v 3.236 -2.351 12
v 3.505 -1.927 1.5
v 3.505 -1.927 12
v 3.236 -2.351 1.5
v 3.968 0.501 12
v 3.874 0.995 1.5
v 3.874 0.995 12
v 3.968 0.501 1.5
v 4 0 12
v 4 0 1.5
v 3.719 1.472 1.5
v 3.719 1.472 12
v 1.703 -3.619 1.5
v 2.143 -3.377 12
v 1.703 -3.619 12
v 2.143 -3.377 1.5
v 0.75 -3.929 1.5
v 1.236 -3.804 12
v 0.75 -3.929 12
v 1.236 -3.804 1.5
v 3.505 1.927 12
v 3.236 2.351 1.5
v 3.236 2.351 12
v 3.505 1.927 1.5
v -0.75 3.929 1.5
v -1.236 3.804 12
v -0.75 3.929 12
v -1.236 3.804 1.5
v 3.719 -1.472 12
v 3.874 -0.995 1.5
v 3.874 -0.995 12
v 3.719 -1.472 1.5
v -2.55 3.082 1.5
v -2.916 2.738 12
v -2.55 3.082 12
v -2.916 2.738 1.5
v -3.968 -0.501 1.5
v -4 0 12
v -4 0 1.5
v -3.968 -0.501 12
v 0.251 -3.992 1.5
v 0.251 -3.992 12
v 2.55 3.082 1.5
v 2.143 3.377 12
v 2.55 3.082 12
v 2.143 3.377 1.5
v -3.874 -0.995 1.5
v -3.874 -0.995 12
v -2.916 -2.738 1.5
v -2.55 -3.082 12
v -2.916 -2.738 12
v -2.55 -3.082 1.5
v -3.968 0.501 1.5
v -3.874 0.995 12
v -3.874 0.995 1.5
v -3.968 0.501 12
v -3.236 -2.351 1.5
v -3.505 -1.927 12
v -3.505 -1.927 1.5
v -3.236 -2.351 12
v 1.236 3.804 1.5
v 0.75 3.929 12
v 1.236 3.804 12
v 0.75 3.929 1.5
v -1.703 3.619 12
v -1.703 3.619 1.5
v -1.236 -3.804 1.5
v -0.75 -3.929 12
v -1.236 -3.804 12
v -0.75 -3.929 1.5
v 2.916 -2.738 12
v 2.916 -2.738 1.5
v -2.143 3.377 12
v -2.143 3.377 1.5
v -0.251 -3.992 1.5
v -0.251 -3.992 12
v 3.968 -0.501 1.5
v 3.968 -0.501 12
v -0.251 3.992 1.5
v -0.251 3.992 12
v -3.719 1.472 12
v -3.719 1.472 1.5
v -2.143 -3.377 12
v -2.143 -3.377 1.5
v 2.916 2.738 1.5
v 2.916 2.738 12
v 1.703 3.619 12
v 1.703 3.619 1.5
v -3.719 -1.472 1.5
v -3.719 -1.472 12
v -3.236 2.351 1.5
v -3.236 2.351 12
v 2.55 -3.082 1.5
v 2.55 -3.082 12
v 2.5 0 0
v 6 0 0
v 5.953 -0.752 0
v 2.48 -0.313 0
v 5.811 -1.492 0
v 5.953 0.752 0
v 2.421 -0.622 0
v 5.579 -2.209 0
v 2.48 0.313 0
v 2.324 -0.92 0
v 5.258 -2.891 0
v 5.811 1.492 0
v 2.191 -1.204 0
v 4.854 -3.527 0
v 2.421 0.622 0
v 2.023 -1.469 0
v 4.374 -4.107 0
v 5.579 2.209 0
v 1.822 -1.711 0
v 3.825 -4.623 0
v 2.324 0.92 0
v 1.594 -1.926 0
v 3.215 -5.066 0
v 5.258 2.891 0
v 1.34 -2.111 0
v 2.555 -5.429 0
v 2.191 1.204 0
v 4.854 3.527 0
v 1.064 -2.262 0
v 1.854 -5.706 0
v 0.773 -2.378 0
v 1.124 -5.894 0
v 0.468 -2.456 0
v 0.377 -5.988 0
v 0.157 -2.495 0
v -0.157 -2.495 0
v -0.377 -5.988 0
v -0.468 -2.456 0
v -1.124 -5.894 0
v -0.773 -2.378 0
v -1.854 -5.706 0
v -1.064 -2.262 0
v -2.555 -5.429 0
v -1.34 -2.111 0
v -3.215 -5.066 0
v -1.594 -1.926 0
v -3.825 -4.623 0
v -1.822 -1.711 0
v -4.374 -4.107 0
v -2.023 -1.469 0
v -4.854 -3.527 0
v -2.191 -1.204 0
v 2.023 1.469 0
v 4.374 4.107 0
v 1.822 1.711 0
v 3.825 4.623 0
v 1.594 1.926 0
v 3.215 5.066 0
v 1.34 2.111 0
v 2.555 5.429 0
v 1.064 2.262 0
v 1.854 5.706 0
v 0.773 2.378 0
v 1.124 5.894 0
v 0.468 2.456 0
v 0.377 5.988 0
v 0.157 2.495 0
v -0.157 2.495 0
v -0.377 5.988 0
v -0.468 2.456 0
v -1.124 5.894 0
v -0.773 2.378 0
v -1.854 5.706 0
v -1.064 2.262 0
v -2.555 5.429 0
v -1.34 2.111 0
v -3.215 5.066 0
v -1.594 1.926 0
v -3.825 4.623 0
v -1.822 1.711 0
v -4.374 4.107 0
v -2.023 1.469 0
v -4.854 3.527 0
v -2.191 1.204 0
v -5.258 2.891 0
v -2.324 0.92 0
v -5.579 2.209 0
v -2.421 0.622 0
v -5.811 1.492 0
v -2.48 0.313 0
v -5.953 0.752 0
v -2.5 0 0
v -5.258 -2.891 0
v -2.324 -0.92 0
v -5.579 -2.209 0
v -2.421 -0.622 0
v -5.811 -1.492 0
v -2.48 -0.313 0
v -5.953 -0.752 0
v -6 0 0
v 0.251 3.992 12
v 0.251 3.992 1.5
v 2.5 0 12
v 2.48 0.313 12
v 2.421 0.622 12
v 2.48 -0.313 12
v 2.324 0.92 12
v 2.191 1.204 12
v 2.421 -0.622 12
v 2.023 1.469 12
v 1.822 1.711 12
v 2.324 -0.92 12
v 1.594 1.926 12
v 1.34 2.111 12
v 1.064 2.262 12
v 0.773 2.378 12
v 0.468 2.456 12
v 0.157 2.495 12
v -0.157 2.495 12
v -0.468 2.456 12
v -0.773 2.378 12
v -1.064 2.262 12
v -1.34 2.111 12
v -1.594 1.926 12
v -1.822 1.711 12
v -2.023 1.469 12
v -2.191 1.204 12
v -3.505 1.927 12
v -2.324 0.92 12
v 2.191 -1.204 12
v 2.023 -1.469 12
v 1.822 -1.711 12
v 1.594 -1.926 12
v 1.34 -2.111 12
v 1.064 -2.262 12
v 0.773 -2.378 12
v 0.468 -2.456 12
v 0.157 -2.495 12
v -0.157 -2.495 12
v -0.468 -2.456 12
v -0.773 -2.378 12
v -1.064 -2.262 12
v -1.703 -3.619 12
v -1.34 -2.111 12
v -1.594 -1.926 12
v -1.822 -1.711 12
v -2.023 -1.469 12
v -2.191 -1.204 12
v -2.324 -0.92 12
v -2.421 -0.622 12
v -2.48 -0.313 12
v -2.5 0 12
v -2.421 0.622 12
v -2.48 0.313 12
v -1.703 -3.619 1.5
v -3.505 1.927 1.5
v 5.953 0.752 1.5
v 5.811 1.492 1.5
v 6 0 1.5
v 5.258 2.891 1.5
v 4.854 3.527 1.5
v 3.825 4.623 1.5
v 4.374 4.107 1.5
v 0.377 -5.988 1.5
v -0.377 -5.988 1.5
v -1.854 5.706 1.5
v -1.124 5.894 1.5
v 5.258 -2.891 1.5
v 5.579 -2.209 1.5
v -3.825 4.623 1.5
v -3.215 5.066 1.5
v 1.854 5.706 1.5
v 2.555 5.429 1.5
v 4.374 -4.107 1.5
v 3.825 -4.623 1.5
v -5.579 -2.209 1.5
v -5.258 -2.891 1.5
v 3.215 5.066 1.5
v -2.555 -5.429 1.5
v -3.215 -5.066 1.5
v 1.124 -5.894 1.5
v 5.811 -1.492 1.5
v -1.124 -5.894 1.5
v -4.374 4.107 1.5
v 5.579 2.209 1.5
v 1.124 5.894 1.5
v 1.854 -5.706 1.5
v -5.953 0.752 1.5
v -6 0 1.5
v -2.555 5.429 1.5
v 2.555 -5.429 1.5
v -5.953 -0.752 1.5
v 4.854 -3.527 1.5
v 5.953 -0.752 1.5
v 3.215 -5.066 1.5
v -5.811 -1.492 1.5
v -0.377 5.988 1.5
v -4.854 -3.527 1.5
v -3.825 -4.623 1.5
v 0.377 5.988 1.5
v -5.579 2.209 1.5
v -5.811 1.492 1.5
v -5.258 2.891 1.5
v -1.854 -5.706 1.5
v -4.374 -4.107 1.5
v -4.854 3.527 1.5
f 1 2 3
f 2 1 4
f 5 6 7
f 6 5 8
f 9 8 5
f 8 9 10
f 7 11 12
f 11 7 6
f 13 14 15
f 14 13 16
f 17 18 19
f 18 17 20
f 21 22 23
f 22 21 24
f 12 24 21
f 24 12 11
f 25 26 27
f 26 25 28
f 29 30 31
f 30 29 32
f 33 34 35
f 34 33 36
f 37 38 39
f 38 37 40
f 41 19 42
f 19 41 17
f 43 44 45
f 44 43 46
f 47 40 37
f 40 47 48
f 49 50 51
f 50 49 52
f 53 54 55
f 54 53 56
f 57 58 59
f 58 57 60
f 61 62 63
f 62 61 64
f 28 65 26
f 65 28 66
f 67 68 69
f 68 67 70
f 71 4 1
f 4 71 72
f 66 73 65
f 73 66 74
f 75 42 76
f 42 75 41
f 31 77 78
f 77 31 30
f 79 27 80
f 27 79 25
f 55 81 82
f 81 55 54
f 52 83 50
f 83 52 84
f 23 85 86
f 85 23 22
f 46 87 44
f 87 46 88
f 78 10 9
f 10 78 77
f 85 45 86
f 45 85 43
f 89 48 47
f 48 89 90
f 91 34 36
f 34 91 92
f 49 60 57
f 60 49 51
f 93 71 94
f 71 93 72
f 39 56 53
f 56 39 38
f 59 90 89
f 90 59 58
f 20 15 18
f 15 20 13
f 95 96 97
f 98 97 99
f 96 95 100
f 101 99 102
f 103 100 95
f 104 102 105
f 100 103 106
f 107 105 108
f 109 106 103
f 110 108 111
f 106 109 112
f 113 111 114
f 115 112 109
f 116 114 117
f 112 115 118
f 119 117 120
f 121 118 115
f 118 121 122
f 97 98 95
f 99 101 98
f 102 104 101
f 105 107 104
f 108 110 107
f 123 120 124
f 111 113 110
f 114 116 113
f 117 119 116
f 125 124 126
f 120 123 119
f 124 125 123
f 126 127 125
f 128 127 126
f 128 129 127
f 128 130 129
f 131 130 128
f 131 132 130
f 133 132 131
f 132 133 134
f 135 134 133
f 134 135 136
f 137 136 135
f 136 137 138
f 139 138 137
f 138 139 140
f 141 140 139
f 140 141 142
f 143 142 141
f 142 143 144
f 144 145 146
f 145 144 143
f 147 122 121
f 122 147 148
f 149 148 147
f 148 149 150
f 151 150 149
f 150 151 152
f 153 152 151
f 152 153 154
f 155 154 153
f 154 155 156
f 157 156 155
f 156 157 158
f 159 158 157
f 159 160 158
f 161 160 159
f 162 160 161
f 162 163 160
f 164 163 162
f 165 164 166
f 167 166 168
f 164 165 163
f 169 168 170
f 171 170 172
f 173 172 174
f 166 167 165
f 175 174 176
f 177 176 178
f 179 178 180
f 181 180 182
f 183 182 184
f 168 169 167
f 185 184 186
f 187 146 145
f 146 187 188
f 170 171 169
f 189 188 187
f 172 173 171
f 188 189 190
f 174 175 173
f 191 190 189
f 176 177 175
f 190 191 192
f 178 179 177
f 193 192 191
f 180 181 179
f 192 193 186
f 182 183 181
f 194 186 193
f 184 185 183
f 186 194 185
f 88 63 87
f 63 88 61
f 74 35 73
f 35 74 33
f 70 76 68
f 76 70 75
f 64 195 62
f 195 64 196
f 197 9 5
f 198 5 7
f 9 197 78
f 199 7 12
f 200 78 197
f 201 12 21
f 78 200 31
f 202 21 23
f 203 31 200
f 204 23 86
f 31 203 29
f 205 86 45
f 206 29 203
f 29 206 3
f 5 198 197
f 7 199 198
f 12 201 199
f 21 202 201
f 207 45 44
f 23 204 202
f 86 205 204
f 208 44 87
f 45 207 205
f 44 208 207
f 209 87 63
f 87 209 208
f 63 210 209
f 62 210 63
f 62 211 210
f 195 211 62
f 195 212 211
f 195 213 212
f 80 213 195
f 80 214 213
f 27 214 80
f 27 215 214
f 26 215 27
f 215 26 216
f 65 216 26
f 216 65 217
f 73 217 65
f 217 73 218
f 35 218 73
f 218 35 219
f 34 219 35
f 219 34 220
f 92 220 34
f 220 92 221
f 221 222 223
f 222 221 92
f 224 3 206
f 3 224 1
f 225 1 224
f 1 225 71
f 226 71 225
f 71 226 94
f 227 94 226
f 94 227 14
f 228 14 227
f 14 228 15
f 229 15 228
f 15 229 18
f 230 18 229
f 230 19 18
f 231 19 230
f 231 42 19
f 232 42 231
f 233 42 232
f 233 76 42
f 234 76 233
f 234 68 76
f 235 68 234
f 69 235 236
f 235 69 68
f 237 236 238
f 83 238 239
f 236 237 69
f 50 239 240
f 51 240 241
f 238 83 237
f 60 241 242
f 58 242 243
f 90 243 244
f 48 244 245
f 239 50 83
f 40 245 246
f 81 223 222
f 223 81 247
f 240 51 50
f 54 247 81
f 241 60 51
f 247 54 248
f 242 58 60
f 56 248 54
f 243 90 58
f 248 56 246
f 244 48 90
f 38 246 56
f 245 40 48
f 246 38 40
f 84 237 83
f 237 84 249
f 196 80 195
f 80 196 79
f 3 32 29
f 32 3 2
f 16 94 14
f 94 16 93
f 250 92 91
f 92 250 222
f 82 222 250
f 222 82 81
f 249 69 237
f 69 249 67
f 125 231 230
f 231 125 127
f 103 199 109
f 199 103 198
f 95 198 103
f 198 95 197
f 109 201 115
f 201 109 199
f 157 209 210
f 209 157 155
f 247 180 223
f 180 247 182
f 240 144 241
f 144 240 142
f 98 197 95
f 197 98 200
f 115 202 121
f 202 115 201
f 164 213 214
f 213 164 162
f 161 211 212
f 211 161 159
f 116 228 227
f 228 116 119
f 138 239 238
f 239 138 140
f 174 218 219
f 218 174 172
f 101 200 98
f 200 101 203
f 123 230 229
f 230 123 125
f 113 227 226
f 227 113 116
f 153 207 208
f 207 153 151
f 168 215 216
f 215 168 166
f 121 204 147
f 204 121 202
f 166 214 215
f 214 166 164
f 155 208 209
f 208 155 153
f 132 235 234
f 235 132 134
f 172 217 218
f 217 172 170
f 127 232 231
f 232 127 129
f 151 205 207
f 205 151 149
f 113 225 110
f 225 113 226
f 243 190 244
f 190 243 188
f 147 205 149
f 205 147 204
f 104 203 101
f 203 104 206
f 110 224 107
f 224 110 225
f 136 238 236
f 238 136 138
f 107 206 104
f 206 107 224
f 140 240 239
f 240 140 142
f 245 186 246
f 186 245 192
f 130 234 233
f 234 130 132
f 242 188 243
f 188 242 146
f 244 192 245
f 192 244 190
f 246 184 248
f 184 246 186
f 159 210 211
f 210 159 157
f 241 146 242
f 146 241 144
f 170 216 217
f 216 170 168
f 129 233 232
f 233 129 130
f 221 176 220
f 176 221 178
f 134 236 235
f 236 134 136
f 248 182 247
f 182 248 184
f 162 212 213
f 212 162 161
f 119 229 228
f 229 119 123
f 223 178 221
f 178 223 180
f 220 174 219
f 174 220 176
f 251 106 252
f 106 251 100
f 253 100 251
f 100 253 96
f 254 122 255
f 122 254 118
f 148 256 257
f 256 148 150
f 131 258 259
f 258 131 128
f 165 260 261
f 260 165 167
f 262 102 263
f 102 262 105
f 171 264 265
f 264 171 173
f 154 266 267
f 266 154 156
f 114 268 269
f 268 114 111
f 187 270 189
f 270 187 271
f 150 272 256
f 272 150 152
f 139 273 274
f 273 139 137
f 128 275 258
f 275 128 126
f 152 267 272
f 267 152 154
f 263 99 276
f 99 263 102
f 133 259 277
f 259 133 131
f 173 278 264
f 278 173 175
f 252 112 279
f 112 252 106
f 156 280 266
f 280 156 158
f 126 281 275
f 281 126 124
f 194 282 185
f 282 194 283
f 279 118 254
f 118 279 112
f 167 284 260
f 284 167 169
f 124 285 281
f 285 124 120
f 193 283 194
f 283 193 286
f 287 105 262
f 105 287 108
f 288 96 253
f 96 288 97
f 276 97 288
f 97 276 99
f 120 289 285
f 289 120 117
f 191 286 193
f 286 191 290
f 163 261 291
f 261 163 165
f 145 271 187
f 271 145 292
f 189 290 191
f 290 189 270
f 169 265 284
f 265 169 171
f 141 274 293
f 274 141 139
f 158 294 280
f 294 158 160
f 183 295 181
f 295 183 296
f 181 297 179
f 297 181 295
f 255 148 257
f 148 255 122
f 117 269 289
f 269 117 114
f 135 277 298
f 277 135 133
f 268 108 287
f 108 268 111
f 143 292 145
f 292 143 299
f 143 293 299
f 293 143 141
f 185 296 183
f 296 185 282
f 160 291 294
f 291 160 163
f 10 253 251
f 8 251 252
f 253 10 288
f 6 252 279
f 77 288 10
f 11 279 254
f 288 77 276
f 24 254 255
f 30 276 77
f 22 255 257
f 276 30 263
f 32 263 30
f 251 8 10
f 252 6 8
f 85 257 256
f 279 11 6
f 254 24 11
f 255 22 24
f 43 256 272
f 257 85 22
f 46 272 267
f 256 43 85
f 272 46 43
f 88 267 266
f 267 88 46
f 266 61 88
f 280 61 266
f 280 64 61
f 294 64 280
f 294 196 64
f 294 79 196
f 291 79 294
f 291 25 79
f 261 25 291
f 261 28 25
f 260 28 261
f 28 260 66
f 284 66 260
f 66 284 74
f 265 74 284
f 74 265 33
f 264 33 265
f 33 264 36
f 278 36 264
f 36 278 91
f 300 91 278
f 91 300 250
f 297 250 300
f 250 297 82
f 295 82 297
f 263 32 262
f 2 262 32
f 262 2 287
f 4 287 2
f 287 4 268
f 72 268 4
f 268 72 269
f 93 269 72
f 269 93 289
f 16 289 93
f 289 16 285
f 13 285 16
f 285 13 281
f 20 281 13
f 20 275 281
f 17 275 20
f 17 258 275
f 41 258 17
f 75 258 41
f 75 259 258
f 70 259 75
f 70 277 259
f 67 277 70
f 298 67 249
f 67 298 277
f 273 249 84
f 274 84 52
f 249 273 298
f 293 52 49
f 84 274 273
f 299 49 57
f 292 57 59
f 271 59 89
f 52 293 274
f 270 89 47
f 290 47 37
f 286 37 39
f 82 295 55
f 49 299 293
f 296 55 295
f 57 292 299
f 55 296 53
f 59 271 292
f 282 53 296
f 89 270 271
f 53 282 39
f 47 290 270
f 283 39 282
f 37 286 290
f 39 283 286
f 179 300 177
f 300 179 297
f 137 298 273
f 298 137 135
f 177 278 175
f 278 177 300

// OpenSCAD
// CSG file generated from FreeCAD Export 0.1d

// variable description
spacer_height = 12; // possible values
spacer_diameter = 8; // 
inner_diameter = 5; //
rim_diameter = 12; //
rim_height = 1.5;

// Cylinder
difference() {
	// Outer Cylinder
	cylinder(h = spacer_height, d= spacer_diameter, $fn=50);
	// Inner Cylinder
	cylinder(h = spacer_height, d= inner_diameter, $fn=50);
}

// RIM
difference() {
	cylinder(h = rim_height, d= rim_diameter, $fn=50);
	// Inner Cylinder
	cylinder(h = spacer_height, d= inner_diameter, $fn=50);
}
